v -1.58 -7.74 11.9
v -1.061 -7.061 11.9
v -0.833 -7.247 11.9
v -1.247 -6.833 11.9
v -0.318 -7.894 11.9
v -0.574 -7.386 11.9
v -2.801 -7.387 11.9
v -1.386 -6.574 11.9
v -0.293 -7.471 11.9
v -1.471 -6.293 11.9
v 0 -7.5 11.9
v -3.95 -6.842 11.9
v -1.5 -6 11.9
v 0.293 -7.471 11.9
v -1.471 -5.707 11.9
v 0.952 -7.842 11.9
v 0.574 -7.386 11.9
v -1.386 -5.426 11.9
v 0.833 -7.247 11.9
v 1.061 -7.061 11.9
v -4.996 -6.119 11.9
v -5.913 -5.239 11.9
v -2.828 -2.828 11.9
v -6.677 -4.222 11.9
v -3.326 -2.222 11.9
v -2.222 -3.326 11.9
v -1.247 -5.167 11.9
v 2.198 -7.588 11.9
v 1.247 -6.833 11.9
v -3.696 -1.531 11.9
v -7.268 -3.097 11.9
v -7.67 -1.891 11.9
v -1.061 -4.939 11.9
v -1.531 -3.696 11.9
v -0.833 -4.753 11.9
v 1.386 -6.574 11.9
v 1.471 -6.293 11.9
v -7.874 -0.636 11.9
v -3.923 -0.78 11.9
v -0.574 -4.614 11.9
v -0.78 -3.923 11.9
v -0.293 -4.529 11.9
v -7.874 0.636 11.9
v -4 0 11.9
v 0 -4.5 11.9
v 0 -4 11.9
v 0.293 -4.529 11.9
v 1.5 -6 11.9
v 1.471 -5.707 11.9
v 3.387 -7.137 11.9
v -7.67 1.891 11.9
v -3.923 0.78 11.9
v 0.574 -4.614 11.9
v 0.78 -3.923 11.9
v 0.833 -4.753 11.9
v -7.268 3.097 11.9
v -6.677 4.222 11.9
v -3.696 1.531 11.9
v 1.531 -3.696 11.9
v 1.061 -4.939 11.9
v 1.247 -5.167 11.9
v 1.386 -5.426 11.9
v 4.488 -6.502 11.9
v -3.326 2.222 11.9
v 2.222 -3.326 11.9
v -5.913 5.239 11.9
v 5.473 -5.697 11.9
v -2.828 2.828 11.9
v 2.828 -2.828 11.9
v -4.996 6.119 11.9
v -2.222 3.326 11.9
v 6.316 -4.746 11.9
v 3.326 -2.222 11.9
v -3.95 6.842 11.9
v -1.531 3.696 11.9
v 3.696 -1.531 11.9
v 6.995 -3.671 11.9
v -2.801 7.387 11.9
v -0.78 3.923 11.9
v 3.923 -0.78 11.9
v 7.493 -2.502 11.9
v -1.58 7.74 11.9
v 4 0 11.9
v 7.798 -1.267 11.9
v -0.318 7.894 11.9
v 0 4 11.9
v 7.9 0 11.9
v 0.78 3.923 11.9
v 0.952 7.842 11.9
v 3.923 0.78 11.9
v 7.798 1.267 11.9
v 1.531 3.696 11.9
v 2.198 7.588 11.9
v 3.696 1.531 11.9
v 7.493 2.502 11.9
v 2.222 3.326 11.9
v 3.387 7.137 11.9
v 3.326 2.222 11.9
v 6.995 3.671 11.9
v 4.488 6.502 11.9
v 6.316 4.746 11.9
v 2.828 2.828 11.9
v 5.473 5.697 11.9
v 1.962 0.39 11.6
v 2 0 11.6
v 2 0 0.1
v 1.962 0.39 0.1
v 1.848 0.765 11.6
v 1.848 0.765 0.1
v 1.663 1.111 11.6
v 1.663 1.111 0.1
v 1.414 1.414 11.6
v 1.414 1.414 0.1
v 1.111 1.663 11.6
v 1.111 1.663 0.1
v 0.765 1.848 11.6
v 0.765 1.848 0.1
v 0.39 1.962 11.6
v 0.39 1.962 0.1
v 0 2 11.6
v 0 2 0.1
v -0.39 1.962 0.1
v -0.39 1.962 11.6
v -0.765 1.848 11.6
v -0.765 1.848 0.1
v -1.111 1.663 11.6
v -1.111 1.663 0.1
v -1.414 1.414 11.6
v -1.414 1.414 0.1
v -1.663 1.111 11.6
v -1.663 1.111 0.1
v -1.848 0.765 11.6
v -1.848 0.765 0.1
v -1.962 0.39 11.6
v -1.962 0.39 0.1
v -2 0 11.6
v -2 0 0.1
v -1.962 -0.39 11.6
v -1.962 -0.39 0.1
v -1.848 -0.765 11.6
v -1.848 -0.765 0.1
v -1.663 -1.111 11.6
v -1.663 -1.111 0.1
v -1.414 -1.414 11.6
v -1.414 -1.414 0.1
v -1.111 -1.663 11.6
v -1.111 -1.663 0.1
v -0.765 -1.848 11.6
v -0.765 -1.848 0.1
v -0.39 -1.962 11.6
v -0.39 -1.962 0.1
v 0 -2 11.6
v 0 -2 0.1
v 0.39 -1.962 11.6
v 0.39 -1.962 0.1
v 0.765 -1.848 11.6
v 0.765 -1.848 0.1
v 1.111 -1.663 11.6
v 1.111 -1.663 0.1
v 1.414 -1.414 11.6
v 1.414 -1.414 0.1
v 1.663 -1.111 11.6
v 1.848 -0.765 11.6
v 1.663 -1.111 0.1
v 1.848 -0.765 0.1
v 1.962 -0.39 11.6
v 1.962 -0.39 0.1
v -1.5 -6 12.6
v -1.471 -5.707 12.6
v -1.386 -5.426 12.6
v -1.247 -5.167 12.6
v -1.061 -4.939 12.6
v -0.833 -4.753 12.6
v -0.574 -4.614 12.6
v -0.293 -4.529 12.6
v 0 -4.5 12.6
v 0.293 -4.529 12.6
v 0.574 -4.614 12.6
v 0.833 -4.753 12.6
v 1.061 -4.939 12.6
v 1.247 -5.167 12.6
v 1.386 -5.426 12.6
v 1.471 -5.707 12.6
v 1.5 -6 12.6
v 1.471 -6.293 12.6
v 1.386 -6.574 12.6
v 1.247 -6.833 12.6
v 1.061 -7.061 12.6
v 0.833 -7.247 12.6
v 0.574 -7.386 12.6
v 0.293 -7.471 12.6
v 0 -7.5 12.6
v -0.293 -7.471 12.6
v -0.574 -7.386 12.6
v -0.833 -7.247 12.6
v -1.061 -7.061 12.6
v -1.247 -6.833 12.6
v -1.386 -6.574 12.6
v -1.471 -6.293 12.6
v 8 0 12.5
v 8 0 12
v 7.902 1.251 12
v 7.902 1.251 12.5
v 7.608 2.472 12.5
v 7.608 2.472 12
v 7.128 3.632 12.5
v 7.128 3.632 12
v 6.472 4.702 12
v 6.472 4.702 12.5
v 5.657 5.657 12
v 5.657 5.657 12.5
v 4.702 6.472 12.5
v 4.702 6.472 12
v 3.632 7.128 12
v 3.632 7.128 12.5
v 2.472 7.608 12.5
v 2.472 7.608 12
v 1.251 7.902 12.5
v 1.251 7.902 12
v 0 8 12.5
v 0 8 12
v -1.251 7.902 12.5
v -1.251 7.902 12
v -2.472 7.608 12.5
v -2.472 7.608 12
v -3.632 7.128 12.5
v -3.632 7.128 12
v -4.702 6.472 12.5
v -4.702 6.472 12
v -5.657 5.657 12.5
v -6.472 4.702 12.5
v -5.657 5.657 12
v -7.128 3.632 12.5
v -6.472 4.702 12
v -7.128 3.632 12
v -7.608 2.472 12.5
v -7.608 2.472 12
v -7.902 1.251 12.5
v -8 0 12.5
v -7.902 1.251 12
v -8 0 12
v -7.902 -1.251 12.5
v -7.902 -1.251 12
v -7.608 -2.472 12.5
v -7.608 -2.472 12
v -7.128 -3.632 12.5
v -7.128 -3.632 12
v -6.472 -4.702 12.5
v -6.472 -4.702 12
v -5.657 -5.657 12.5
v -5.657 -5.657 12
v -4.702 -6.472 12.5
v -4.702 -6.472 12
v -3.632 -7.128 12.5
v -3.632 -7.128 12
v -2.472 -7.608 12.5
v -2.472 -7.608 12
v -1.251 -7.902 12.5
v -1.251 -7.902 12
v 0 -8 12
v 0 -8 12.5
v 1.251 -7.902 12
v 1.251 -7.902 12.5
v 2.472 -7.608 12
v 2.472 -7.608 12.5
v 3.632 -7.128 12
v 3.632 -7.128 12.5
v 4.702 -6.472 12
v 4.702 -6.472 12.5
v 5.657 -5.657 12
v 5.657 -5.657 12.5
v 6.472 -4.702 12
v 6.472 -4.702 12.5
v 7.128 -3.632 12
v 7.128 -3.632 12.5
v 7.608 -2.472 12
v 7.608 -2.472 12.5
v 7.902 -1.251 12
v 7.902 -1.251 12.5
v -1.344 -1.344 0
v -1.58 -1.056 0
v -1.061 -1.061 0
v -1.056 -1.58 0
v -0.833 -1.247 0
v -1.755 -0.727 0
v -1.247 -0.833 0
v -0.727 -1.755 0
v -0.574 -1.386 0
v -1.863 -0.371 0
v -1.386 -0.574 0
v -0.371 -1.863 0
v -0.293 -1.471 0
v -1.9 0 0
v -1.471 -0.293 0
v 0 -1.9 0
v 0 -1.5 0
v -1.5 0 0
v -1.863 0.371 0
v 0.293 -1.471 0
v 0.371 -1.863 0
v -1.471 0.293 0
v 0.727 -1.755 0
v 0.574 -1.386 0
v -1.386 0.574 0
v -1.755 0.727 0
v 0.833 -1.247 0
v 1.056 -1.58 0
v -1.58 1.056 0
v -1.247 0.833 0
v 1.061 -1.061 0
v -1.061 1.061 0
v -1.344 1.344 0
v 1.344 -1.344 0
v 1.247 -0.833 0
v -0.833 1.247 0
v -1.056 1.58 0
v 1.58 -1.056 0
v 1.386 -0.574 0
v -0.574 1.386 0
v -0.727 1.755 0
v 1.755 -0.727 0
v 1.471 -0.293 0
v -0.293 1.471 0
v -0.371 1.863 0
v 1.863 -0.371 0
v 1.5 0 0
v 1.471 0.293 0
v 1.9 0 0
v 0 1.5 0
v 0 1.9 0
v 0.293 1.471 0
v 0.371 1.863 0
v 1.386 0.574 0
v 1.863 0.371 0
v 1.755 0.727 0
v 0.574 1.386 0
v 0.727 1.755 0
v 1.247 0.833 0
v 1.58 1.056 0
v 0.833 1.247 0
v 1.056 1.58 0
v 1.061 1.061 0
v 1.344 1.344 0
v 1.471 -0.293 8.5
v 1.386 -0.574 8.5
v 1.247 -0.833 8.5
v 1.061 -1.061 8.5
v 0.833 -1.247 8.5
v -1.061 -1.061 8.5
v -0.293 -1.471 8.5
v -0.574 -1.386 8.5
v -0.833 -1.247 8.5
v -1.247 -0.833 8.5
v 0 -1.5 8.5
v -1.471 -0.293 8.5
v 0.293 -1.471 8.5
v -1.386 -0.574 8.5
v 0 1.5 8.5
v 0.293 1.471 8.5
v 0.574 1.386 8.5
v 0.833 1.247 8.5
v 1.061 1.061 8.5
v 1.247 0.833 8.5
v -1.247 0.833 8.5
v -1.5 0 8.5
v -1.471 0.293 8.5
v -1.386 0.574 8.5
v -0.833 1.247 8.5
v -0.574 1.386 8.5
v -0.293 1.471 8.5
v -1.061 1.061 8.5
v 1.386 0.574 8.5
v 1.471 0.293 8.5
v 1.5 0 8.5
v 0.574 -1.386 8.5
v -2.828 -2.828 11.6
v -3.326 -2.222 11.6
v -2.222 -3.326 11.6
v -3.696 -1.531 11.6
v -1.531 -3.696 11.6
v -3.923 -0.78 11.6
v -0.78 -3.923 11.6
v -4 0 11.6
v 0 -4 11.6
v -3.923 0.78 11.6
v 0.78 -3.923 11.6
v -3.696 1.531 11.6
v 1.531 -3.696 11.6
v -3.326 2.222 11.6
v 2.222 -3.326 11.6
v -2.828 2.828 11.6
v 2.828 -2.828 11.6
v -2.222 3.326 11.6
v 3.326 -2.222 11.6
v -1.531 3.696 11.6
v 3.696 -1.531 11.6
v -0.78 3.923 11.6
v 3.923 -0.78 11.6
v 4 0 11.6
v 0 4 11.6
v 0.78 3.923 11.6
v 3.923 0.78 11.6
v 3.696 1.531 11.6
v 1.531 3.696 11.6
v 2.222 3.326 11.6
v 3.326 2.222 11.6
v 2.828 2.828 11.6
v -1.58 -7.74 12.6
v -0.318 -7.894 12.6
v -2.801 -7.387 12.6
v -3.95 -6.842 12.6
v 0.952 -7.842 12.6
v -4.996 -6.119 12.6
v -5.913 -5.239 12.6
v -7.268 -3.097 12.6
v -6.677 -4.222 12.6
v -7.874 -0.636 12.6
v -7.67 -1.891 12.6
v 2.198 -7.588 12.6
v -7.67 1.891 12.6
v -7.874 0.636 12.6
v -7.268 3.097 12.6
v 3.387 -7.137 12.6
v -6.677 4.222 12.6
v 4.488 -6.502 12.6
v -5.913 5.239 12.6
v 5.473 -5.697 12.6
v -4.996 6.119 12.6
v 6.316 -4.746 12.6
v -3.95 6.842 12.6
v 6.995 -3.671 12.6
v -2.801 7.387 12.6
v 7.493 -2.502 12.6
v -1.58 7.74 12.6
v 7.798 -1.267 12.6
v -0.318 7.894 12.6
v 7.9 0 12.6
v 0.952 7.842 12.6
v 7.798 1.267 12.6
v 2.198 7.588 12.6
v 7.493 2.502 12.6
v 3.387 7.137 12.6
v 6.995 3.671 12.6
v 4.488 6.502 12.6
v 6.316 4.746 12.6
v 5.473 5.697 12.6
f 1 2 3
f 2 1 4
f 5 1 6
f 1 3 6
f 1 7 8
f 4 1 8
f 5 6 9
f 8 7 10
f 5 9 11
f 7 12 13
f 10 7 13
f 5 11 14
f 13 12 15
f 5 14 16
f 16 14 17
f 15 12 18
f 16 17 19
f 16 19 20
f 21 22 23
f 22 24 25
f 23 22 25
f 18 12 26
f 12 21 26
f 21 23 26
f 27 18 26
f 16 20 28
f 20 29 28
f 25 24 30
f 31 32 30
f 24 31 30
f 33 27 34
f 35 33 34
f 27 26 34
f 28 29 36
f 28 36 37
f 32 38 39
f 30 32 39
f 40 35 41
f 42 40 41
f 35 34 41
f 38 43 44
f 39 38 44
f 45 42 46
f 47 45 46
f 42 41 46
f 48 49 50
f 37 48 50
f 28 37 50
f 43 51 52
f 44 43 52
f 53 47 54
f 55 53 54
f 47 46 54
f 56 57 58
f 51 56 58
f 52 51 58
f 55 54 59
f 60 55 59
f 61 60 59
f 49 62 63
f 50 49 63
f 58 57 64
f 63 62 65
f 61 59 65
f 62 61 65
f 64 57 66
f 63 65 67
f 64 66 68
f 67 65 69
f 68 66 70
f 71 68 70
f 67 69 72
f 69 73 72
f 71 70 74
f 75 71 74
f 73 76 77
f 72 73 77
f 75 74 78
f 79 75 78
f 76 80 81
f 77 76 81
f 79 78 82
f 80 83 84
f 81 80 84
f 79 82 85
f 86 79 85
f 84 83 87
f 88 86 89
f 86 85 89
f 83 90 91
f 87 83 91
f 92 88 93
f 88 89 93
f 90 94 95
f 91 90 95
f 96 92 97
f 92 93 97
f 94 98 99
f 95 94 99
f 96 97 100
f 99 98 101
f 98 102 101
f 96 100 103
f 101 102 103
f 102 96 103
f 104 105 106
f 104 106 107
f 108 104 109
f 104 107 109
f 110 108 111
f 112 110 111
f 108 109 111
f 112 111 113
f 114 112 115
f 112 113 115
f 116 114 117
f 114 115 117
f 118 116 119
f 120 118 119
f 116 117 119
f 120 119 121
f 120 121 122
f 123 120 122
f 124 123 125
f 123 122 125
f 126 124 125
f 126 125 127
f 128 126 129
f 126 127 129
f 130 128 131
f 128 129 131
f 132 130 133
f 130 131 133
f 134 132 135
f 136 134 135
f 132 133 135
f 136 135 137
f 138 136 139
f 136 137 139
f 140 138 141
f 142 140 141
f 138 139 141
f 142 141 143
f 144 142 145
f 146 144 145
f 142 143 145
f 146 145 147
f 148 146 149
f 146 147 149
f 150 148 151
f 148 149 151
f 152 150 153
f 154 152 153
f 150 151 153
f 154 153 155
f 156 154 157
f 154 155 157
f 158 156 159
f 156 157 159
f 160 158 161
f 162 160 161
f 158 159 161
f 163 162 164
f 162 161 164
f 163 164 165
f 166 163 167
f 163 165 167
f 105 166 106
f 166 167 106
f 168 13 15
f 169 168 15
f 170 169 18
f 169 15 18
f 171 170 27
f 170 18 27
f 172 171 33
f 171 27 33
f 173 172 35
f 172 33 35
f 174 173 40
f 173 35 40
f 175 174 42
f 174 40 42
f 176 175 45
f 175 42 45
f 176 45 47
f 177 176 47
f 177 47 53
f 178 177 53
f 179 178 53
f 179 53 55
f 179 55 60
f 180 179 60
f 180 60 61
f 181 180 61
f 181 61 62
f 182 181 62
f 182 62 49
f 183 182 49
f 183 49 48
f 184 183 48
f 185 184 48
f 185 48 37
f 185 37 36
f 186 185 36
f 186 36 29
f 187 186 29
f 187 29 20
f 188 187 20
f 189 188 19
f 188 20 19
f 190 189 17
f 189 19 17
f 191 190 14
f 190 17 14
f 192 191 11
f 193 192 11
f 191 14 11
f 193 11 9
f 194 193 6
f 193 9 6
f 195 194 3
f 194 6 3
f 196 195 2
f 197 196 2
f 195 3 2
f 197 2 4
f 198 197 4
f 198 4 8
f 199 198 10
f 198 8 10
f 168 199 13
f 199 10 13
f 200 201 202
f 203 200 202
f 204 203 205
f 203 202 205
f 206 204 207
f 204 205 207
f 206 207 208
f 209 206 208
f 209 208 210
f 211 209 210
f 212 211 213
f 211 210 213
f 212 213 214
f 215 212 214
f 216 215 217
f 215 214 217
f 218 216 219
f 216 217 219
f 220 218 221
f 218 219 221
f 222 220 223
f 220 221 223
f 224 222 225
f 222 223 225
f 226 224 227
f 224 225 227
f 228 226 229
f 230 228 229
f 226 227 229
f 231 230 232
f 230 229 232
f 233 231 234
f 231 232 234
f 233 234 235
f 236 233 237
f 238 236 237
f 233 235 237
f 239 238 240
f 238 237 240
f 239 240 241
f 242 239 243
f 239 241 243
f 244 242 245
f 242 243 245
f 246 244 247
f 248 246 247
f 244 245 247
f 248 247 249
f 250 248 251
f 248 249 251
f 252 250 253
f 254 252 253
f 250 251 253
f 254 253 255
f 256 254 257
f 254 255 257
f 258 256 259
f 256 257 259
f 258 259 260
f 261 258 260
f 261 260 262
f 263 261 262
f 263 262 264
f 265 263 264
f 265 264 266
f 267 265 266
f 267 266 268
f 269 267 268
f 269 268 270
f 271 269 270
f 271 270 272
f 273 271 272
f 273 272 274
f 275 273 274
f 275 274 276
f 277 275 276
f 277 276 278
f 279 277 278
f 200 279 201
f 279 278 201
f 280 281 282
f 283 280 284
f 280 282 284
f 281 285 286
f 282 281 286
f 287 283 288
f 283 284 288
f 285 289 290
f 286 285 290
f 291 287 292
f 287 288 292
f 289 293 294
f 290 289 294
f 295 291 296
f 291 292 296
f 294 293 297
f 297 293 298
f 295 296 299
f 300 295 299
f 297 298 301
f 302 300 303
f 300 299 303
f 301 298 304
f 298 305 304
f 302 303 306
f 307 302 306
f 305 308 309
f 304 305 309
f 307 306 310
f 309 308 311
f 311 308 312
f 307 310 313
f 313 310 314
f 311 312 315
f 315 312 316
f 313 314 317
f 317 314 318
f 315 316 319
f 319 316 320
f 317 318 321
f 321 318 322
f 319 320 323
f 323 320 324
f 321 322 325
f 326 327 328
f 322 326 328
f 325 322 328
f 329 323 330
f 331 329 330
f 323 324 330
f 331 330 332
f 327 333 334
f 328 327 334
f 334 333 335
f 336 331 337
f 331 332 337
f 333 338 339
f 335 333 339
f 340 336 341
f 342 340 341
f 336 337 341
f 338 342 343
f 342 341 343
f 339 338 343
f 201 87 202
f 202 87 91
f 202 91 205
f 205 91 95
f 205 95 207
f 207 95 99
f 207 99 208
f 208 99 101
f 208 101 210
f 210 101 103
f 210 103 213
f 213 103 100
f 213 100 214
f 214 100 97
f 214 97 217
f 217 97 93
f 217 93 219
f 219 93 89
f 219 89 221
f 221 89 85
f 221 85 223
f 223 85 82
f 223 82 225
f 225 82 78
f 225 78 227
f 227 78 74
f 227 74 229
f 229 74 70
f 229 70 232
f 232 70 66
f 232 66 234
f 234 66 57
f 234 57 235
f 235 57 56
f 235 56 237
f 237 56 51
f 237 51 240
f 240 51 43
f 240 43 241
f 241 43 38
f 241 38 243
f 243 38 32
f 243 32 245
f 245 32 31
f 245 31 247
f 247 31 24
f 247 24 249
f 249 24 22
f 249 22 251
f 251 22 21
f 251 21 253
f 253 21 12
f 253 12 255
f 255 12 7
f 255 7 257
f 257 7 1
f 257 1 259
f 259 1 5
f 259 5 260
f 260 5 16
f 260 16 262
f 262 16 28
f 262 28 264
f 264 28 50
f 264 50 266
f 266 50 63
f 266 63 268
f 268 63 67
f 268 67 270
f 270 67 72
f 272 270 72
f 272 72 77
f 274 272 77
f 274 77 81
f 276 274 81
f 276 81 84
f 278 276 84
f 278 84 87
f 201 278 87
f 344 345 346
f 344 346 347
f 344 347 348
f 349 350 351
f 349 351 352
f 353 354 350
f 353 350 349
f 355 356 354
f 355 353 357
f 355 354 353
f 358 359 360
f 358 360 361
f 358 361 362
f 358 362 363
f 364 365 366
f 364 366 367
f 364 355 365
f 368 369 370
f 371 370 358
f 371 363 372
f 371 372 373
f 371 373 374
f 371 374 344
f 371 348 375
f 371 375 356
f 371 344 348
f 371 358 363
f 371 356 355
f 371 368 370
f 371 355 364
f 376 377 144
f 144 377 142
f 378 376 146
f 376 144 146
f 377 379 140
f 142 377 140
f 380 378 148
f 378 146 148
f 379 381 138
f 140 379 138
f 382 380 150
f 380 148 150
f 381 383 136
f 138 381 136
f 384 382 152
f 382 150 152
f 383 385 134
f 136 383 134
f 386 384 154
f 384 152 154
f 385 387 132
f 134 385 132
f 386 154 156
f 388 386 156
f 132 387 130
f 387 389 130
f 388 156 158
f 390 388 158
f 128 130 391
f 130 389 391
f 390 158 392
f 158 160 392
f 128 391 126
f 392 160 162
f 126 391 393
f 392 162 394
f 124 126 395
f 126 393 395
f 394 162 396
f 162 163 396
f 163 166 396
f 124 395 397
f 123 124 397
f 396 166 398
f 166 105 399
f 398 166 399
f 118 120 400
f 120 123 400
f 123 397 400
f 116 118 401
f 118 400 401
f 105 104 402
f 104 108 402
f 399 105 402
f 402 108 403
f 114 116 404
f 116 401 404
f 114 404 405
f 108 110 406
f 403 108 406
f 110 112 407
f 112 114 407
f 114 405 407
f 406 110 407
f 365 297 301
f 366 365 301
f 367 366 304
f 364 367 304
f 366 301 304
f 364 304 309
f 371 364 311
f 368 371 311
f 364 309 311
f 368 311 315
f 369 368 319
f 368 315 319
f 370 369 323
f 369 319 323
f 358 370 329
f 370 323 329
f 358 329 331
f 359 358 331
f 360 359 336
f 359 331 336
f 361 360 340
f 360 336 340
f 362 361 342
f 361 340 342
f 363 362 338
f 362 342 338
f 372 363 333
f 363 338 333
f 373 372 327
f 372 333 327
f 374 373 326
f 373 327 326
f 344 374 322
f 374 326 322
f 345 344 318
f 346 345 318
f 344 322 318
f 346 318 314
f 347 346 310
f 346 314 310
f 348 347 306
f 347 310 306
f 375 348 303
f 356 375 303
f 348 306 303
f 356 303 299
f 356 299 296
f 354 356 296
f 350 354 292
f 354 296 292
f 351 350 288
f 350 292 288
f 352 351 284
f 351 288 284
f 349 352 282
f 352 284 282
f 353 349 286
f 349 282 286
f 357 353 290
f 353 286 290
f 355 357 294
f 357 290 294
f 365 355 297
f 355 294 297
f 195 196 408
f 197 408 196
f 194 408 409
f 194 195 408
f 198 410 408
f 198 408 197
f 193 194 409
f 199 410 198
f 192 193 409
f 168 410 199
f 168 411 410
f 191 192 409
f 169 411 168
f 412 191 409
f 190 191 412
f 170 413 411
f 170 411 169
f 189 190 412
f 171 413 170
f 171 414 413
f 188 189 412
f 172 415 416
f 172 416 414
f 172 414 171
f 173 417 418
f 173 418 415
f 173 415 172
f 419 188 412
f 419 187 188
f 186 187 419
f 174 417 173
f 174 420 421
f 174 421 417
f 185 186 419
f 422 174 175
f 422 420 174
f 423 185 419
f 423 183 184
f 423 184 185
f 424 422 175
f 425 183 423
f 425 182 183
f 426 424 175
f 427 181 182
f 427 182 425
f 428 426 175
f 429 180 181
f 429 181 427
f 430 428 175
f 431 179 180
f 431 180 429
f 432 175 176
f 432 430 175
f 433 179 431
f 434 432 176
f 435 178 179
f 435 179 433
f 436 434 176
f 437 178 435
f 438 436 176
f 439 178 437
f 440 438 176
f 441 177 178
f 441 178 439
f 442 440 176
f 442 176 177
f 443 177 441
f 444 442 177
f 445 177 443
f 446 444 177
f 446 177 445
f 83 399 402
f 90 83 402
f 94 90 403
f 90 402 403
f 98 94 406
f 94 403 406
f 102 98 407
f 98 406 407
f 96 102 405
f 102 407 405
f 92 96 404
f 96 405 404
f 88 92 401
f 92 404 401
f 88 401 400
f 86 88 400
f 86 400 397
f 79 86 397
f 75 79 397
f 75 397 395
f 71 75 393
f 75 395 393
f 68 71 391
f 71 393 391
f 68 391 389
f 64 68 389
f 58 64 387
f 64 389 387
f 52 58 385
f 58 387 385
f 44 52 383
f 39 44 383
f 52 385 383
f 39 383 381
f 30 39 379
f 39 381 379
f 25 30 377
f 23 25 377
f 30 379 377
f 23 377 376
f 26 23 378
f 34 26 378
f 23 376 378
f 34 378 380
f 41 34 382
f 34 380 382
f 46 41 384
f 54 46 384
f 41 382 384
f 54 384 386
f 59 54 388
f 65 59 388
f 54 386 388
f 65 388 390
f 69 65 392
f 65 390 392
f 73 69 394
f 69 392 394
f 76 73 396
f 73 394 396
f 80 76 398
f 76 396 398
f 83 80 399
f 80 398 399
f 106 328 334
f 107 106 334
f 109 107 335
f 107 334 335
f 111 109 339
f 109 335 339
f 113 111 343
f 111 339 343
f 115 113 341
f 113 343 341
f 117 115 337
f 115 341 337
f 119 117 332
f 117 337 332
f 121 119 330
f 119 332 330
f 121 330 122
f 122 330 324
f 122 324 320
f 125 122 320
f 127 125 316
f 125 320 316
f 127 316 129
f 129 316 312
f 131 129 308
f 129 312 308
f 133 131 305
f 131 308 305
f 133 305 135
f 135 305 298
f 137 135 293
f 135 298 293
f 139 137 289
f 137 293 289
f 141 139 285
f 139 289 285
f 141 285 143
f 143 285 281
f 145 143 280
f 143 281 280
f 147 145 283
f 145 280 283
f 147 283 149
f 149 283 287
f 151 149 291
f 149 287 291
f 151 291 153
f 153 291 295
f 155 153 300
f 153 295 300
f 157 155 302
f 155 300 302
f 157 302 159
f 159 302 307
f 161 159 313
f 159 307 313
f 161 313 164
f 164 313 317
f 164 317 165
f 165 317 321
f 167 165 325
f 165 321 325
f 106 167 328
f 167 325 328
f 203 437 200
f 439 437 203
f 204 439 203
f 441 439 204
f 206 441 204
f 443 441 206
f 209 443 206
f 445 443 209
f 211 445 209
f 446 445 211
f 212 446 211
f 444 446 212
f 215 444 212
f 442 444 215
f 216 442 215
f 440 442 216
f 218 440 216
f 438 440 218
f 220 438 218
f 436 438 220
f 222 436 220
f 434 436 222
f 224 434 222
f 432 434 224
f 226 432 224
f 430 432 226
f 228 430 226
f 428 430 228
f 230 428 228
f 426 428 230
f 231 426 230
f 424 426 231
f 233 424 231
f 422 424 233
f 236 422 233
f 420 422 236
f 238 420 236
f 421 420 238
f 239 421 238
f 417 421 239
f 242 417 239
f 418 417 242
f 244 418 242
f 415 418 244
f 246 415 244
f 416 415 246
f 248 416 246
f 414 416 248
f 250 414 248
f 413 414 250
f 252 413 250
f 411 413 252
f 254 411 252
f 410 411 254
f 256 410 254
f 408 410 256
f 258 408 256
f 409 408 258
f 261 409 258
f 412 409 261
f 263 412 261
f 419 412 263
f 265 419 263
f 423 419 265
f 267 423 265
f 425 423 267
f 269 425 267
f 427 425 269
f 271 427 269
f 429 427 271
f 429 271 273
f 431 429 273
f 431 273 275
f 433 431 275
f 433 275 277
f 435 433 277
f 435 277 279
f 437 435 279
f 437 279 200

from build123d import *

# Parameters (mm, degrees)
SKETCH2_R           = 2
BOSS_EXTRUDE1_DEPTH = 11.6
SKETCH3_R           = 4
BOSS_EXTRUDE2_DEPTH = 0.3
SKETCH4_R           = 8
BOSS_EXTRUDE3_DEPTH = 0.7
SKETCH5_R           = 1.5
CUT_EXTRUDE1_DEPTH  = 8.5
SKETCH7_R           = 1.5
CUT_EXTRUDE2_DEPTH  = 17.419805115
CHAMFER1_SIZE       = 0.1


with BuildPart() as part:
    # Sketch2 → Boss-Extrude1 (new body)
    with BuildSketch(Plane.XY):
        Circle(SKETCH2_R)
    extrude(amount=BOSS_EXTRUDE1_DEPTH)

    # Sketch3 → Boss-Extrude2 (add)
    with BuildSketch(Plane.XY.offset(11.6)):
        Circle(SKETCH3_R)
    extrude(amount=BOSS_EXTRUDE2_DEPTH)

    # Sketch4 → Boss-Extrude3 (add)
    with BuildSketch(Plane.XY.offset(11.9)):
        Circle(SKETCH4_R)
    extrude(amount=BOSS_EXTRUDE3_DEPTH)

    # Sketch5 → Cut-Extrude1 (cut)
    with BuildSketch(Plane(origin=(0, 0, 0), x_dir=(-1, 0, 0), z_dir=(0, 0, -1))):
        Circle(SKETCH5_R)
    extrude(amount=-CUT_EXTRUDE1_DEPTH, mode=Mode.SUBTRACT)

    # Sketch7 → Cut-Extrude2 (cut, through all)
    with BuildSketch(Plane(origin=(0, 0, 11.9), x_dir=(-1, 0, 0), z_dir=(0, 0, -1))):
        with Locations((0, -6)):
            Circle(SKETCH7_R)
    extrude(amount=-CUT_EXTRUDE2_DEPTH, mode=Mode.SUBTRACT)

    # Chamfer1
    chamfer1_edges = [part.edges().sort_by_distance(p)[0] for p in [
        (-8, 0, 12.6),
        (-2, 0, 0),
        (-8, 0, 11.9),
    ]]
    chamfer(chamfer1_edges, length=CHAMFER1_SIZE)


solid = part.part
